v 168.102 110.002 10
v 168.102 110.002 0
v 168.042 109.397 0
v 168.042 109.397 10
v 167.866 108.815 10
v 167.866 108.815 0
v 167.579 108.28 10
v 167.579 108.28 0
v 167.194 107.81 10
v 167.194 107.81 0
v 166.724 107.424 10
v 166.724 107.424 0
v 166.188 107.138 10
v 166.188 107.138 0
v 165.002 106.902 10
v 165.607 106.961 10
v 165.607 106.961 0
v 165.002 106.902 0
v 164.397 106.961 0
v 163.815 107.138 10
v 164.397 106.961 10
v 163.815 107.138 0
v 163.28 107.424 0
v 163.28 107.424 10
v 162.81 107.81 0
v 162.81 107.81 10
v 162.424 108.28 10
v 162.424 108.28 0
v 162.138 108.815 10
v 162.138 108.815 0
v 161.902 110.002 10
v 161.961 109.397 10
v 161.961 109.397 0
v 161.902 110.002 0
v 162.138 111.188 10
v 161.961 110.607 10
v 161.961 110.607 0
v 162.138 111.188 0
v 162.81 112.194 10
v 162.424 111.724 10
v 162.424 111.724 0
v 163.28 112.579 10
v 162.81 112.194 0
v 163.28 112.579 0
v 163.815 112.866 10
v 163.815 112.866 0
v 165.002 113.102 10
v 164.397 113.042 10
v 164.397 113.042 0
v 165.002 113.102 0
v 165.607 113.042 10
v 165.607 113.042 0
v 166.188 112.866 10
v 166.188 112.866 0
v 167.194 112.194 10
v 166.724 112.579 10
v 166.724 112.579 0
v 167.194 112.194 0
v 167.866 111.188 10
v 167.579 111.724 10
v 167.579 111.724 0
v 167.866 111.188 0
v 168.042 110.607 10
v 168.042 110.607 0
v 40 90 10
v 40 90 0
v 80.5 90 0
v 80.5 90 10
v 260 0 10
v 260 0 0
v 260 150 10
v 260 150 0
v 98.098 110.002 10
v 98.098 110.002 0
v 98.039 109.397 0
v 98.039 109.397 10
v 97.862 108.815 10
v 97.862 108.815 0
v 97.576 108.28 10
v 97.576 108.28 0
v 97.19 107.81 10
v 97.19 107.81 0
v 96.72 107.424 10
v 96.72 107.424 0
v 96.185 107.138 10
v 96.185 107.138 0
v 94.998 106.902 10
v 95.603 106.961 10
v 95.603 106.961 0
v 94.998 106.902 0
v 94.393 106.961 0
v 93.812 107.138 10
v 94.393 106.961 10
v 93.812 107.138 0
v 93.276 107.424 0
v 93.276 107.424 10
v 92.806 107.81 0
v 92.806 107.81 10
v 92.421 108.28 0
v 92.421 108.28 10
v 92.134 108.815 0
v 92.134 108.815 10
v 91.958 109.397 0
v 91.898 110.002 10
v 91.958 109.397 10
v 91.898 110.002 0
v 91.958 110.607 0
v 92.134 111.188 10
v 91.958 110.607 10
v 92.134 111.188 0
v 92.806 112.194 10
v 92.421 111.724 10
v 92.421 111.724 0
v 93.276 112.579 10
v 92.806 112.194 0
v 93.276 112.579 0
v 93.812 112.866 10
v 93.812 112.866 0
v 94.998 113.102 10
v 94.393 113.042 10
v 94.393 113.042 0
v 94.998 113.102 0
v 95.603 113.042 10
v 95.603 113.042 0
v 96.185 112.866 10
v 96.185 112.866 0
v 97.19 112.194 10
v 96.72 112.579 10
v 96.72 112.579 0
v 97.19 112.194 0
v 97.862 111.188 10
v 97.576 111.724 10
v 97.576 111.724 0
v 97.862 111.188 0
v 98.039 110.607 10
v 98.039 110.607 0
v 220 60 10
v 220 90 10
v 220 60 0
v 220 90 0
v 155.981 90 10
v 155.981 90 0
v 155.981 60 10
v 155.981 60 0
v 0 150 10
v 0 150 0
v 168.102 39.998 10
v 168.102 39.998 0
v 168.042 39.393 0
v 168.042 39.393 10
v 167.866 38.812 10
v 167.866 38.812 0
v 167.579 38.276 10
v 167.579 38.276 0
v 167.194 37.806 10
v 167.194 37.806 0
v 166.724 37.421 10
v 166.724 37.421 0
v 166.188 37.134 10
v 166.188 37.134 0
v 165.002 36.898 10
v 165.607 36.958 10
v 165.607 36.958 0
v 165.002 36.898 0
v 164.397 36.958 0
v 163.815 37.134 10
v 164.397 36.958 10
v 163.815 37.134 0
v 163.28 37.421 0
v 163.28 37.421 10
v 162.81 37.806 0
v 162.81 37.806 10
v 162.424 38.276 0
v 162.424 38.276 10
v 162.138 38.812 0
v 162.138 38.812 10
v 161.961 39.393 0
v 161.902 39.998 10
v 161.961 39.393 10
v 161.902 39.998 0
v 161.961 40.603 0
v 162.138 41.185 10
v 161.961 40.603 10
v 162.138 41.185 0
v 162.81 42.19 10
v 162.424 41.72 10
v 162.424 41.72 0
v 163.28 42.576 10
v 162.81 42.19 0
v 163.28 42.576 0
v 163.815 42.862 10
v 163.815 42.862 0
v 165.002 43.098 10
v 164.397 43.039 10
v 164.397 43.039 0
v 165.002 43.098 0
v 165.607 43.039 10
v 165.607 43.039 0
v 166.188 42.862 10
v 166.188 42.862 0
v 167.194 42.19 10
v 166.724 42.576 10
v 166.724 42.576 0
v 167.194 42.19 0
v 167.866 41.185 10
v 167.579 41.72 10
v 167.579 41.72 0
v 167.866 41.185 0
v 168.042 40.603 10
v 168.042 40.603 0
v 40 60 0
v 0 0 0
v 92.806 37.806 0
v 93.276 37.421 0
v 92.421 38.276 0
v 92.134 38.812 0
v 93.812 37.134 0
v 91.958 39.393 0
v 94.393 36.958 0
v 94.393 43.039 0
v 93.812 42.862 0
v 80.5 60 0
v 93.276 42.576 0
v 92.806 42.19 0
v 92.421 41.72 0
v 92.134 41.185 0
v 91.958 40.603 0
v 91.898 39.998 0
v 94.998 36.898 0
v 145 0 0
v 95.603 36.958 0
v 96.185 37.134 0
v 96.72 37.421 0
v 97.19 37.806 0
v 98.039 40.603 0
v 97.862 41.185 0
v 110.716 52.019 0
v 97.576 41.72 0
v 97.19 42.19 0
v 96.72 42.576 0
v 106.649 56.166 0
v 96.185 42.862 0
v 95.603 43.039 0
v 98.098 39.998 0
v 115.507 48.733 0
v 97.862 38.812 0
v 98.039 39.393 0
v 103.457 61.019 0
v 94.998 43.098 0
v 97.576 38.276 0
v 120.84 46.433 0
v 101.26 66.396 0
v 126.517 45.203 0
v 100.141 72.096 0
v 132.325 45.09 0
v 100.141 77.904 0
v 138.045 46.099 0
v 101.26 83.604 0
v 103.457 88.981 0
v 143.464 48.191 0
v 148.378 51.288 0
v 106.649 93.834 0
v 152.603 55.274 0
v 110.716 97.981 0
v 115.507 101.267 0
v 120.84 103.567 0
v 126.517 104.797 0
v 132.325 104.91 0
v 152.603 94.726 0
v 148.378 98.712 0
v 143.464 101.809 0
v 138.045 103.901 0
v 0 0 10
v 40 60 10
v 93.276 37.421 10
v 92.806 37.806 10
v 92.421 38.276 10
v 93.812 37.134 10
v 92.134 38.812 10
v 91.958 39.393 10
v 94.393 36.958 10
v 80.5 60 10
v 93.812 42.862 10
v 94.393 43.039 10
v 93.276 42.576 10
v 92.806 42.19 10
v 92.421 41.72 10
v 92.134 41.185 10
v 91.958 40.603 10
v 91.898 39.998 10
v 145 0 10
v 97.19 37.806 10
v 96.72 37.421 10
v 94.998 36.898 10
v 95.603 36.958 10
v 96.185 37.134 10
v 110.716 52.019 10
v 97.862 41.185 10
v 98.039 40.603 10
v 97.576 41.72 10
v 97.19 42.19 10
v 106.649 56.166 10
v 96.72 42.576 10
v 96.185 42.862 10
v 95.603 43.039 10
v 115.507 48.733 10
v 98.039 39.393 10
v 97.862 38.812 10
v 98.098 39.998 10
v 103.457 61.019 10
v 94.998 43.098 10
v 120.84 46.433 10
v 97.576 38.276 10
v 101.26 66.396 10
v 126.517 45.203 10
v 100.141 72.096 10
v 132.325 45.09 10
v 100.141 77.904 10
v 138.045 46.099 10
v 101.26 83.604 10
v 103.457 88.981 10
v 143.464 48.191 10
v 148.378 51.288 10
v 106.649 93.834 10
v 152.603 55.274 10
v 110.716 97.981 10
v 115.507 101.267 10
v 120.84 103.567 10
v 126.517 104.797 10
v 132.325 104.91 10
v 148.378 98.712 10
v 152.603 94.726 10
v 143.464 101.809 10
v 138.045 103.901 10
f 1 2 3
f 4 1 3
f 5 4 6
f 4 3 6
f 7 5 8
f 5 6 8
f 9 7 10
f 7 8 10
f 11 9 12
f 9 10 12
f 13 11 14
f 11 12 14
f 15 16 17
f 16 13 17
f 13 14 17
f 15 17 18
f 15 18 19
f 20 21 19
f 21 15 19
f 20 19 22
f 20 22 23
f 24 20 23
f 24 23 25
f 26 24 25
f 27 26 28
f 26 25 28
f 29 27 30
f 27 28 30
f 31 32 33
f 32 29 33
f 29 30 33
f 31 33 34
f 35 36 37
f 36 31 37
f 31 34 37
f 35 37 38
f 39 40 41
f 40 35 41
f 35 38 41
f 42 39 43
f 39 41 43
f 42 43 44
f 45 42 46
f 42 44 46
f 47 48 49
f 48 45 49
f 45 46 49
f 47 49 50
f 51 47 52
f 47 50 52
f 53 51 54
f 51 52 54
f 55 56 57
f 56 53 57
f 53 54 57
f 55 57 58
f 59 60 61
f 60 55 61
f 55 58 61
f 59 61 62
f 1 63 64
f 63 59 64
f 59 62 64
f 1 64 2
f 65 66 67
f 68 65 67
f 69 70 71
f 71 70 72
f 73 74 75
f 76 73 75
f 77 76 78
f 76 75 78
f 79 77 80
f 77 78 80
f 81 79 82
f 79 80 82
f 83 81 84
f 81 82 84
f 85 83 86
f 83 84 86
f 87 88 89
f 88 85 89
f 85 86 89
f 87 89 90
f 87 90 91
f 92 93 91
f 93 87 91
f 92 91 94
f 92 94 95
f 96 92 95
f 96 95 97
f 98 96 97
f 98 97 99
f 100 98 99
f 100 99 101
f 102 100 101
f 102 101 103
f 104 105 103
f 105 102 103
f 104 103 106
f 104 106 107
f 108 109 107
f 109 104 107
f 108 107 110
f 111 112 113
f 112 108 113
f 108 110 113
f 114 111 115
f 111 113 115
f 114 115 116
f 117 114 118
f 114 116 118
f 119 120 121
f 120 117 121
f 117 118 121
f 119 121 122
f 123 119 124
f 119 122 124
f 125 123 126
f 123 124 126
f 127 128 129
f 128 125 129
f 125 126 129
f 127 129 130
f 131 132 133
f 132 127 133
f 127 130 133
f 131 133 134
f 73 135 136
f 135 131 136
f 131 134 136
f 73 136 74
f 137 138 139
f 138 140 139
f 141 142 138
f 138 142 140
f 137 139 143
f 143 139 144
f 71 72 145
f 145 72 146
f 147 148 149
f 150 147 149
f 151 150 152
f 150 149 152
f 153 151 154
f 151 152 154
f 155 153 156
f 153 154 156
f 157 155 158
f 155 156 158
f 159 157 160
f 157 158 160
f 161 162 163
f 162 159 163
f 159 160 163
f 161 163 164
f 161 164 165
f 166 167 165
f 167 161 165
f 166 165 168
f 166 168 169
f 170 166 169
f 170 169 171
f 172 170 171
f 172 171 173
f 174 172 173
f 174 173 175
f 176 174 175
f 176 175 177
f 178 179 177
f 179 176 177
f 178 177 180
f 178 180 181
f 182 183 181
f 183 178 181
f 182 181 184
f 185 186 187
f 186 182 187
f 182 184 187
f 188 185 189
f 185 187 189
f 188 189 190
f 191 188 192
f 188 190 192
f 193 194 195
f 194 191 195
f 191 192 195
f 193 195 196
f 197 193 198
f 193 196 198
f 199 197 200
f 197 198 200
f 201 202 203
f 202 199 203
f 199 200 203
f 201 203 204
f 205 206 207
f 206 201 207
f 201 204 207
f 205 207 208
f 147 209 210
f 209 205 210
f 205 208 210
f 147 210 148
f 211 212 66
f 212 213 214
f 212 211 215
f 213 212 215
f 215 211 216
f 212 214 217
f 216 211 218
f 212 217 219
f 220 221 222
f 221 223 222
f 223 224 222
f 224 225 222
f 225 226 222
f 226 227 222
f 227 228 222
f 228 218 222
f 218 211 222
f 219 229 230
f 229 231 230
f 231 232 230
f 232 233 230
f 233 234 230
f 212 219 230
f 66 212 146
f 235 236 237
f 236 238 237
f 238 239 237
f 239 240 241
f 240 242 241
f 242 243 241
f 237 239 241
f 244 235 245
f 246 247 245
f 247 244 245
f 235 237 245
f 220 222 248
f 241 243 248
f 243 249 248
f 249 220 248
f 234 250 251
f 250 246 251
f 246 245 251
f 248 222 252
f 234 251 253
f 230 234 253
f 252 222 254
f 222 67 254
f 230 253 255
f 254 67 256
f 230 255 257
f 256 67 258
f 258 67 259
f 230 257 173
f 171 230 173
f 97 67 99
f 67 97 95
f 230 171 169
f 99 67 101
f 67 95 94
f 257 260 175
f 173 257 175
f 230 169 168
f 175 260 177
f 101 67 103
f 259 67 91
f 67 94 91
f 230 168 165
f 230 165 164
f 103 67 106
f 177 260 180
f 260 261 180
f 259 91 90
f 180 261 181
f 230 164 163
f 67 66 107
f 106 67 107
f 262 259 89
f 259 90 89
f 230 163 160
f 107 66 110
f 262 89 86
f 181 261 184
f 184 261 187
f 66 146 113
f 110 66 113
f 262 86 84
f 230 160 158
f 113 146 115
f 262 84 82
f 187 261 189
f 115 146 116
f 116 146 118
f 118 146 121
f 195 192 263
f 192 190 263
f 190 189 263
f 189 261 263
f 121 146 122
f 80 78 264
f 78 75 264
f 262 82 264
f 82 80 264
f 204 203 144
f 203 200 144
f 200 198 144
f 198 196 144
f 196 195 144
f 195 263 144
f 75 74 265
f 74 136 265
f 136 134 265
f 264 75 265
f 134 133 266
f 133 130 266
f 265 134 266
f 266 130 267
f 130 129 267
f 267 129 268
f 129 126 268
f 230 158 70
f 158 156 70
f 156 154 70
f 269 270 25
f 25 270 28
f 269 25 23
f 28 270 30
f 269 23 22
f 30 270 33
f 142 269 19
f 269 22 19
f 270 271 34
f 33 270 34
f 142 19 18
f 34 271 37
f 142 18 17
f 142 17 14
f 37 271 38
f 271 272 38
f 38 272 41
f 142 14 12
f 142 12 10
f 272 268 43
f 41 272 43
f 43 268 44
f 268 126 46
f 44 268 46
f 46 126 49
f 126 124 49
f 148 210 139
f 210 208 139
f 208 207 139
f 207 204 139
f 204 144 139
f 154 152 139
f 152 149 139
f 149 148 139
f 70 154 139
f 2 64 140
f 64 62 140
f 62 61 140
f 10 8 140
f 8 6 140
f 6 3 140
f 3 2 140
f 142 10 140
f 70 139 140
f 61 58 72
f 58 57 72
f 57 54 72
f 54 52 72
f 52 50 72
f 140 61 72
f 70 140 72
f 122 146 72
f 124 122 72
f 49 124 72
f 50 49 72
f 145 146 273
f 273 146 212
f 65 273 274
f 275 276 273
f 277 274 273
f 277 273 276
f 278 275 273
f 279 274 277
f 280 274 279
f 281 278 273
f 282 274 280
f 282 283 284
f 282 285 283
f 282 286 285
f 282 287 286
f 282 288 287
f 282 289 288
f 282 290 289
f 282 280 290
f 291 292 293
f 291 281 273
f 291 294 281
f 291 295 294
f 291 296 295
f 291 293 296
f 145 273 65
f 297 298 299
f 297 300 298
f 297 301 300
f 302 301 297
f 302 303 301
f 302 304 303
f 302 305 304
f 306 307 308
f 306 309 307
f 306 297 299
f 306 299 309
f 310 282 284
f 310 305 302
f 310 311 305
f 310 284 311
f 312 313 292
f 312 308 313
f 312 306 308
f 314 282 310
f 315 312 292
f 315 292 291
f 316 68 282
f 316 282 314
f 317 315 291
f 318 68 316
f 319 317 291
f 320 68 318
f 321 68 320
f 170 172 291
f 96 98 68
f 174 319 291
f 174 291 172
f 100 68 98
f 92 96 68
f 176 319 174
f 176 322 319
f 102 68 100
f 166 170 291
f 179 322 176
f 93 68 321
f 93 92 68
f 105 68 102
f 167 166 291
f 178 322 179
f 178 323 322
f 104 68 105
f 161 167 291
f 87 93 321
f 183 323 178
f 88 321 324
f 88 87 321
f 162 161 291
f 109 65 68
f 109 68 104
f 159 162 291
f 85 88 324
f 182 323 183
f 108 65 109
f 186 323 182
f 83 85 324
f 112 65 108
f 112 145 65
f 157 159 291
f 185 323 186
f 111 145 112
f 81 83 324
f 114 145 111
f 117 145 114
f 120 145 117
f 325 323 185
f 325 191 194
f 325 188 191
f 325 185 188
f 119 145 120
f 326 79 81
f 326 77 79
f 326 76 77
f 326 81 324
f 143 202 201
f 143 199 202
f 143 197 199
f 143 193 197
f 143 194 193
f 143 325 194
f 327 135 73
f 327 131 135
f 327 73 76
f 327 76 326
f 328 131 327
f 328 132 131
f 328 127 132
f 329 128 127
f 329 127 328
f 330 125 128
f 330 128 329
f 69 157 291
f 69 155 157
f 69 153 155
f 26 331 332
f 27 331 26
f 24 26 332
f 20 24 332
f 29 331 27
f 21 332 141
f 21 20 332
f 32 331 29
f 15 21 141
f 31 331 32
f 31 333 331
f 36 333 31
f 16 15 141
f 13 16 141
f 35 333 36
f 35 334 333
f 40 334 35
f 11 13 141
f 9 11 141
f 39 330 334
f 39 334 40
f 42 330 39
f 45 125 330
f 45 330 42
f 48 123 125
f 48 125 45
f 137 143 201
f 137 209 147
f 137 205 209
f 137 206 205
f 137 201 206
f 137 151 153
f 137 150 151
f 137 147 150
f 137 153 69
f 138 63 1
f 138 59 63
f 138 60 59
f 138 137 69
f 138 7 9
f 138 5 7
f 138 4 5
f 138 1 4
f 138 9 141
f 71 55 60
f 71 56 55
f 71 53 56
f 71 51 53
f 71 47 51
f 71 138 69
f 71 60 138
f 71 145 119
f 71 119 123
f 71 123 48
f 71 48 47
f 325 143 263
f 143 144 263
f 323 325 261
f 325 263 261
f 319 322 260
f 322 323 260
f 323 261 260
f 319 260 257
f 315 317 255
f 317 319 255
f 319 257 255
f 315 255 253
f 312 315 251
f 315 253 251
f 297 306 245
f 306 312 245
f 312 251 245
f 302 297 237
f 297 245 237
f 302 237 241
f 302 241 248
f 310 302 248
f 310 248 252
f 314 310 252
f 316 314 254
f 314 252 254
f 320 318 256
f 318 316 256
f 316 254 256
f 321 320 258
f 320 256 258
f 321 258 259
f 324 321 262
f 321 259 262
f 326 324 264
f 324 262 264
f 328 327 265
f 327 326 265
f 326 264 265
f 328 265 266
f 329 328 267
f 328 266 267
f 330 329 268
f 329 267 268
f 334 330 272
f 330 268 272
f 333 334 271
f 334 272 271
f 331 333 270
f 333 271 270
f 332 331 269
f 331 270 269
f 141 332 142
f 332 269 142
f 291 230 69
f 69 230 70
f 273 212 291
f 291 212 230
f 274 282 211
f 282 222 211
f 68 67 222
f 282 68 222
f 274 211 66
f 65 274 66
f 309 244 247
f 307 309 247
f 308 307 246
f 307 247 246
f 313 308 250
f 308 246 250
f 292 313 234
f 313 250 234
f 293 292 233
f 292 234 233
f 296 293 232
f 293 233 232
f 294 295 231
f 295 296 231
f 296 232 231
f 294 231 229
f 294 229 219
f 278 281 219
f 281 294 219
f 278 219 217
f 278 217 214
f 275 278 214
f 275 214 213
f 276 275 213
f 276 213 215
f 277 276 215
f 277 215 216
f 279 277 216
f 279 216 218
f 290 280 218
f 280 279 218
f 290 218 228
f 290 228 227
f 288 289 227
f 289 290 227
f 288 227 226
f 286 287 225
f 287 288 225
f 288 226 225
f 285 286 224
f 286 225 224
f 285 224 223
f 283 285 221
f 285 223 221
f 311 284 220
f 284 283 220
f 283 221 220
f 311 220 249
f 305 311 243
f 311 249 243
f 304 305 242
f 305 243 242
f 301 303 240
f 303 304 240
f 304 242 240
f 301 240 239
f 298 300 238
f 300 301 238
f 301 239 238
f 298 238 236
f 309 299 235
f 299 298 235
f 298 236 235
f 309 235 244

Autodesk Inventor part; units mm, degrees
ref_plane "YZ Plane" through (0, 0, 0) normal (1, 0, 0) x (0, 1, 0)
ref_plane "XZ Plane" through (0, 0, 0) normal (0, 1, 0) x (-1, 0, 0)
ref_plane "XY Plane" through (0, 0, 0) normal (0, 0, 1) x (1, 0, 0)
sketch "Skizze2" plane through (0, 0, 0) normal (0, 0, 1) x (1, 0, 0)
  line L0 (145, 0) -> (260, 0)
  line L1 (260, 0) -> (260, 150)
  line L2 (260, 150) -> (0, 150)
  line L3 (0, 150) -> (0, 0)
  line L4 (0, 0) -> (145, 0)
  circle A0 centre (165.0018, 110.0018) radius 3.1
  circle A1 centre (165.0018, 39.9982) radius 3.1
  circle A2 centre (94.9982, 39.9982) radius 3.1
  circle A3 centre (94.9982, 110.0018) radius 3.1
  arc A4 (155.9808, 90) -> (155.9808, 60) centre (130, 75) ccw
  line L5 (155.9808, 90) -> (220, 90)
  line L6 (220, 90) -> (220, 60)
  line L7 (220, 60) -> (155.9808, 60)
  line L8 (40, 90) -> (80.5, 90)
  line L9 (80.5, 90) -> (80.5, 60)
  line L10 (80.5, 60) -> (40, 60)
  line L11 (40, 60) -> (40, 90)
  dimension "d13" = 6.2
  dimension "d14" = 30
  dimension "d15" = 90
  dimension "d16" = 90
  dimension "d17" = 90
  dimension "d18" = 40
  dimension "d19" = 179.5
  dimension "d20" = 220
  dimension "d21" = 260
  dimension "d22" = 150
  dimension "d23" = 60
  dimension "d24" = 90
  dimension "d25" = 260
  dimension "d26" = 0
  dimension "d27" = 90
  dimension "d28" = 60
  dimension "d29" = 150
  dimension "d30" = 150
  dimension "d31" = 0
  dimension "d32" = 0
  dimension "d33" = 150
  dimension "d34" = 0
  dimension "d35" = 0
  dimension "d36" = 0
  dimension "d37" = 0
  dimension "d38" = 90
  dimension "d39" = 40
  dimension "d40" = 40
  dimension "d41" = 90
  dimension "d42" = 60
  dimension "d43" = 40
  dimension "d44" = 40
  dimension "d45" = 60
  dimension "d46" = 94.9982
  dimension "d47" = 110.0018
  dimension "d48" = 94.9982
  dimension "d49" = 39.9982
  dimension "d50" = 104.0192
  dimension "d51" = 104.0192
  dimension "d52" = 115
  dimension "d53" = 115
  dimension "d54" = 115
  dimension "d55" = 0
  dimension "d56" = 165.0018
  dimension "d57" = 110.0018
  dimension "d58" = 165.0018
  dimension "d59" = 39.9982
  dimension "d60" = 90
  dimension "d61" = 179.5
  dimension "d62" = 179.5
  dimension "d63" = 90
  dimension "d64" = 60
  dimension "d65" = 179.5
  dimension "d66" = 179.5
  dimension "d67" = 30
  dimension "d68" = 90
  dimension "d69" = 220
  dimension "d70" = 220
  dimension "d71" = 90
  dimension "d72" = 60
  dimension "d73" = 220
  dimension "d74" = 220
  dimension "d75" = 60
  dimension "d76" = 150
extrude "Extrusion1" add sketch "Skizze2" along normal blind 10
properties part number "MotorHalterung"
